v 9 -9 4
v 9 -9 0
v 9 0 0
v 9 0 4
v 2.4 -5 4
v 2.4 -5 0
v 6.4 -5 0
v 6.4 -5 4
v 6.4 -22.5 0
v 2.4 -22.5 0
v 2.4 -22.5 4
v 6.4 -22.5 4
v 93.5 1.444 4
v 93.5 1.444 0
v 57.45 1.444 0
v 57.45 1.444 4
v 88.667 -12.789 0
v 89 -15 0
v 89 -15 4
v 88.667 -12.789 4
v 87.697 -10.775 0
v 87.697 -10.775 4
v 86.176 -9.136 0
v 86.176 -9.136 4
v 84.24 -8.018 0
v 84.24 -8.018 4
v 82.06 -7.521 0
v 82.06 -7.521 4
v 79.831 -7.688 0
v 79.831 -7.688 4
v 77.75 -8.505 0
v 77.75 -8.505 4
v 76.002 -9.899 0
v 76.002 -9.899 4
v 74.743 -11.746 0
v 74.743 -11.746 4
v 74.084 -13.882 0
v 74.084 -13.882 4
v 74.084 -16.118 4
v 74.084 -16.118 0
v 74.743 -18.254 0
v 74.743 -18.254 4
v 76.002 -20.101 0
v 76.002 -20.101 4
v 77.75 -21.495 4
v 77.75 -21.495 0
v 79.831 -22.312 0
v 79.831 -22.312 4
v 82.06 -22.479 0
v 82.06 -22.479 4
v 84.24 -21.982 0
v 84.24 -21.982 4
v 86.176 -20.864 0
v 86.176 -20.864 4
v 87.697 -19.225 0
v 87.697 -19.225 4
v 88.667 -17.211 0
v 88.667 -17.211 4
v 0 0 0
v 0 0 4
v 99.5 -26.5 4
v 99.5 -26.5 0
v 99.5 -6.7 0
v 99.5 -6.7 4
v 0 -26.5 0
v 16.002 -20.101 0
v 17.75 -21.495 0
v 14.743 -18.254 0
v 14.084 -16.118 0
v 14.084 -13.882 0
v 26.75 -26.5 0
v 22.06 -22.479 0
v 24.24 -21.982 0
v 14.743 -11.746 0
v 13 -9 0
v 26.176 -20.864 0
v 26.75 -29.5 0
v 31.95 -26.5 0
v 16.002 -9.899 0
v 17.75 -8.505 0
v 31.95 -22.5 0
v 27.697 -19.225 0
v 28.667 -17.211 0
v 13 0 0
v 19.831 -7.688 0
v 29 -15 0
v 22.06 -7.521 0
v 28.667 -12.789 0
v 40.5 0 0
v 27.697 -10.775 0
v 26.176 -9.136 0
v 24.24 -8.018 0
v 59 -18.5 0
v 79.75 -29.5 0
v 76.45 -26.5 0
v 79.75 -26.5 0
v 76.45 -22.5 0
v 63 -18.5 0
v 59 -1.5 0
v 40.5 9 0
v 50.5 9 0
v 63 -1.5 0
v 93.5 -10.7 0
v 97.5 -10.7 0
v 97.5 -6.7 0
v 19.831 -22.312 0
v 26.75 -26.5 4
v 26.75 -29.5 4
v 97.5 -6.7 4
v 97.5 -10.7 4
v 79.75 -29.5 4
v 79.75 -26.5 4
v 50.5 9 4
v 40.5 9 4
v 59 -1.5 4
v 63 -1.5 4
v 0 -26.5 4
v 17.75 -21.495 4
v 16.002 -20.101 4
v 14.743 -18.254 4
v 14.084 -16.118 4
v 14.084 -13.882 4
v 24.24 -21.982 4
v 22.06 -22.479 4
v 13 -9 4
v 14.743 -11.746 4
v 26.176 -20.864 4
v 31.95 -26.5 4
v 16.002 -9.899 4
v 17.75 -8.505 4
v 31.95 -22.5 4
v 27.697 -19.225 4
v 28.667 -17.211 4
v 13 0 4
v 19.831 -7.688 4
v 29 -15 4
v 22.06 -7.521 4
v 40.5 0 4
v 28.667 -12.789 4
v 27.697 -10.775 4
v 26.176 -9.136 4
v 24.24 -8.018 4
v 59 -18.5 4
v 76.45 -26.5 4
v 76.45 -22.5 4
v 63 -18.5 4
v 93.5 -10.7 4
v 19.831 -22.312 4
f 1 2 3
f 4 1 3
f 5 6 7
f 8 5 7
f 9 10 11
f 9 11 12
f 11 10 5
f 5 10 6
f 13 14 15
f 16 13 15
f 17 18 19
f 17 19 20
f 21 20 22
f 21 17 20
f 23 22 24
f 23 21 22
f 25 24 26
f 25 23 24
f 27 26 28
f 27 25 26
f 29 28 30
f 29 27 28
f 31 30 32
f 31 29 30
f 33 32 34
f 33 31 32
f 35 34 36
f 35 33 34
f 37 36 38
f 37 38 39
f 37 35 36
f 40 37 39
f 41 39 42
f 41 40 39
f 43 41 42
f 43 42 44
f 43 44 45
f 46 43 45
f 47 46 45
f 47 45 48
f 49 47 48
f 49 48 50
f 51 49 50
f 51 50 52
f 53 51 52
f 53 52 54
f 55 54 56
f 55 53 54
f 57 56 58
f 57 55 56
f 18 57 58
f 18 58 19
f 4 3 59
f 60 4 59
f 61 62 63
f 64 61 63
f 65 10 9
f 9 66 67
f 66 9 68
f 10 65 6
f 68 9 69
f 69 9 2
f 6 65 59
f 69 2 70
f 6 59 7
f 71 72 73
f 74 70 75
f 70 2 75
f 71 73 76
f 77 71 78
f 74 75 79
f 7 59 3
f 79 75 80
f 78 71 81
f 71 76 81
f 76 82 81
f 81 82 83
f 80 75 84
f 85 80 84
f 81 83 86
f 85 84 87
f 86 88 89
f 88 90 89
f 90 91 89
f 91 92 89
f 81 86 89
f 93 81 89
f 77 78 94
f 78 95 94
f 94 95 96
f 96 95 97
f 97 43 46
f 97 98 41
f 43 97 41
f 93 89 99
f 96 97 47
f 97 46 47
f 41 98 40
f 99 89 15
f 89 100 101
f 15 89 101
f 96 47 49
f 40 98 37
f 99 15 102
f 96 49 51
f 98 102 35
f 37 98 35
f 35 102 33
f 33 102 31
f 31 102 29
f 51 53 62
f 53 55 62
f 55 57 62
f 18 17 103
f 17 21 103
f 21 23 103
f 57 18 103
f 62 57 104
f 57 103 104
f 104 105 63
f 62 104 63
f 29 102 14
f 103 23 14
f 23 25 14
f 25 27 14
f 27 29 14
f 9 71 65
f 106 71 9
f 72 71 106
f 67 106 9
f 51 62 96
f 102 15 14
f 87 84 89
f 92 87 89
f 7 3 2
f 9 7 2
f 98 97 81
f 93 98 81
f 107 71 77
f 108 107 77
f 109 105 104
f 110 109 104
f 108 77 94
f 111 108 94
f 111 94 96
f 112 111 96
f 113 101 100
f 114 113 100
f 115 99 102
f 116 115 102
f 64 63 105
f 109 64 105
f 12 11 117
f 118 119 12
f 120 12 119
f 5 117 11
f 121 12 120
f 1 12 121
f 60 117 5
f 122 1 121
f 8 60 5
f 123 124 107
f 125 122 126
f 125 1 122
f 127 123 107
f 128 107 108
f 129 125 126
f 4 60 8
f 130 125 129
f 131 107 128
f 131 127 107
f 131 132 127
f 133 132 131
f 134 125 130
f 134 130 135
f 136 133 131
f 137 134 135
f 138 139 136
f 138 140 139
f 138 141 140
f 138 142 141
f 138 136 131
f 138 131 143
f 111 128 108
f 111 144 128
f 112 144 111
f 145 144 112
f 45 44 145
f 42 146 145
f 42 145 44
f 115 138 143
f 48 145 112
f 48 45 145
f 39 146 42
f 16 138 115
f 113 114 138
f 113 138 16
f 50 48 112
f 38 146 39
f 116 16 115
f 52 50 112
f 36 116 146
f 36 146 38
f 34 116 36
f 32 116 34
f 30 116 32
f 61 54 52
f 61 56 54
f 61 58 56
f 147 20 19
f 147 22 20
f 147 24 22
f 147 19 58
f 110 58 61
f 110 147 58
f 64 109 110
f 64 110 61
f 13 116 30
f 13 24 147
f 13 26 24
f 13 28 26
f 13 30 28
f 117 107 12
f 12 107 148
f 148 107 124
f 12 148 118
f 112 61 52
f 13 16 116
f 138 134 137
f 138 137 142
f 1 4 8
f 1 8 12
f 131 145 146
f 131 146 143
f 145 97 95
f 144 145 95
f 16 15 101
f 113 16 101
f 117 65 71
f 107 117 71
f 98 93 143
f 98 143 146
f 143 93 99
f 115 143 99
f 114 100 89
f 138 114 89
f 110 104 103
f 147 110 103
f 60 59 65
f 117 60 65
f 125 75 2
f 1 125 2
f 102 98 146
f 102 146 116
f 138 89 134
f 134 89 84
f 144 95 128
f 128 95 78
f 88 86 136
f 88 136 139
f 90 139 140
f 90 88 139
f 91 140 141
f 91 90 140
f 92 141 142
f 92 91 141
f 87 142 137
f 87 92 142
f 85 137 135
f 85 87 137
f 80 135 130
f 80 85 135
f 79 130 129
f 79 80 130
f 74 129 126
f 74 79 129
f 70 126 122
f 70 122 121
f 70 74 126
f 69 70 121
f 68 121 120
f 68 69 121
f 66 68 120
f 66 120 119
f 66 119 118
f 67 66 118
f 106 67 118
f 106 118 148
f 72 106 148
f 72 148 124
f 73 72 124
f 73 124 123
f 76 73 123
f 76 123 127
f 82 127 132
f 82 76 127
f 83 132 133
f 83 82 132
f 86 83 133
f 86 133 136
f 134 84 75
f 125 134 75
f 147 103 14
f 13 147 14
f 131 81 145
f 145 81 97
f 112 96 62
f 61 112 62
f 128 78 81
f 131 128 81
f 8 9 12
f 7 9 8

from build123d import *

# Parameters (mm, degrees)
F0_W     = 4
F0_H     = 17.5
F0_R     = 7.5
F0_H_2   = 17
F1_DEPTH = 4


with BuildPart() as f1:
    # F0 (on Top) → F1 (new body)
    with BuildSketch(Plane.XY):
        Polygon((9, 0), (0, 0), (0, -26.5), (26.75, -26.5), (31.95, -26.5), (31.95, -22.5), (76.45, -22.5), (76.45, -26.5), (79.75, -26.5), (99.5, -26.5), (99.5, -6.7), (97.5, -6.7), (97.5, -10.7), (93.5, -10.7), (93.5, 1.444), (57.45, 1.444), (50.5, 9), (40.5, 9), (40.5, 0), (13, 0), (13, -9), (9, -9), align=None)
        with Locations((4.4, -13.75)):
            Rectangle(F0_W, F0_H, mode=Mode.SUBTRACT)
        with Locations((21.5, -15)):
            Circle(F0_R, mode=Mode.SUBTRACT)
        with Locations((81.5, -15)):
            Circle(F0_R, mode=Mode.SUBTRACT)
        with Locations((61, -10)):
            Rectangle(F0_W, F0_H_2, mode=Mode.SUBTRACT)
        Polygon((31.95, -26.5), (26.75, -26.5), (26.75, -29.5), (79.75, -29.5), (79.75, -26.5), (76.45, -26.5), align=None)
    extrude(amount=F1_DEPTH)


solid = f1.part
